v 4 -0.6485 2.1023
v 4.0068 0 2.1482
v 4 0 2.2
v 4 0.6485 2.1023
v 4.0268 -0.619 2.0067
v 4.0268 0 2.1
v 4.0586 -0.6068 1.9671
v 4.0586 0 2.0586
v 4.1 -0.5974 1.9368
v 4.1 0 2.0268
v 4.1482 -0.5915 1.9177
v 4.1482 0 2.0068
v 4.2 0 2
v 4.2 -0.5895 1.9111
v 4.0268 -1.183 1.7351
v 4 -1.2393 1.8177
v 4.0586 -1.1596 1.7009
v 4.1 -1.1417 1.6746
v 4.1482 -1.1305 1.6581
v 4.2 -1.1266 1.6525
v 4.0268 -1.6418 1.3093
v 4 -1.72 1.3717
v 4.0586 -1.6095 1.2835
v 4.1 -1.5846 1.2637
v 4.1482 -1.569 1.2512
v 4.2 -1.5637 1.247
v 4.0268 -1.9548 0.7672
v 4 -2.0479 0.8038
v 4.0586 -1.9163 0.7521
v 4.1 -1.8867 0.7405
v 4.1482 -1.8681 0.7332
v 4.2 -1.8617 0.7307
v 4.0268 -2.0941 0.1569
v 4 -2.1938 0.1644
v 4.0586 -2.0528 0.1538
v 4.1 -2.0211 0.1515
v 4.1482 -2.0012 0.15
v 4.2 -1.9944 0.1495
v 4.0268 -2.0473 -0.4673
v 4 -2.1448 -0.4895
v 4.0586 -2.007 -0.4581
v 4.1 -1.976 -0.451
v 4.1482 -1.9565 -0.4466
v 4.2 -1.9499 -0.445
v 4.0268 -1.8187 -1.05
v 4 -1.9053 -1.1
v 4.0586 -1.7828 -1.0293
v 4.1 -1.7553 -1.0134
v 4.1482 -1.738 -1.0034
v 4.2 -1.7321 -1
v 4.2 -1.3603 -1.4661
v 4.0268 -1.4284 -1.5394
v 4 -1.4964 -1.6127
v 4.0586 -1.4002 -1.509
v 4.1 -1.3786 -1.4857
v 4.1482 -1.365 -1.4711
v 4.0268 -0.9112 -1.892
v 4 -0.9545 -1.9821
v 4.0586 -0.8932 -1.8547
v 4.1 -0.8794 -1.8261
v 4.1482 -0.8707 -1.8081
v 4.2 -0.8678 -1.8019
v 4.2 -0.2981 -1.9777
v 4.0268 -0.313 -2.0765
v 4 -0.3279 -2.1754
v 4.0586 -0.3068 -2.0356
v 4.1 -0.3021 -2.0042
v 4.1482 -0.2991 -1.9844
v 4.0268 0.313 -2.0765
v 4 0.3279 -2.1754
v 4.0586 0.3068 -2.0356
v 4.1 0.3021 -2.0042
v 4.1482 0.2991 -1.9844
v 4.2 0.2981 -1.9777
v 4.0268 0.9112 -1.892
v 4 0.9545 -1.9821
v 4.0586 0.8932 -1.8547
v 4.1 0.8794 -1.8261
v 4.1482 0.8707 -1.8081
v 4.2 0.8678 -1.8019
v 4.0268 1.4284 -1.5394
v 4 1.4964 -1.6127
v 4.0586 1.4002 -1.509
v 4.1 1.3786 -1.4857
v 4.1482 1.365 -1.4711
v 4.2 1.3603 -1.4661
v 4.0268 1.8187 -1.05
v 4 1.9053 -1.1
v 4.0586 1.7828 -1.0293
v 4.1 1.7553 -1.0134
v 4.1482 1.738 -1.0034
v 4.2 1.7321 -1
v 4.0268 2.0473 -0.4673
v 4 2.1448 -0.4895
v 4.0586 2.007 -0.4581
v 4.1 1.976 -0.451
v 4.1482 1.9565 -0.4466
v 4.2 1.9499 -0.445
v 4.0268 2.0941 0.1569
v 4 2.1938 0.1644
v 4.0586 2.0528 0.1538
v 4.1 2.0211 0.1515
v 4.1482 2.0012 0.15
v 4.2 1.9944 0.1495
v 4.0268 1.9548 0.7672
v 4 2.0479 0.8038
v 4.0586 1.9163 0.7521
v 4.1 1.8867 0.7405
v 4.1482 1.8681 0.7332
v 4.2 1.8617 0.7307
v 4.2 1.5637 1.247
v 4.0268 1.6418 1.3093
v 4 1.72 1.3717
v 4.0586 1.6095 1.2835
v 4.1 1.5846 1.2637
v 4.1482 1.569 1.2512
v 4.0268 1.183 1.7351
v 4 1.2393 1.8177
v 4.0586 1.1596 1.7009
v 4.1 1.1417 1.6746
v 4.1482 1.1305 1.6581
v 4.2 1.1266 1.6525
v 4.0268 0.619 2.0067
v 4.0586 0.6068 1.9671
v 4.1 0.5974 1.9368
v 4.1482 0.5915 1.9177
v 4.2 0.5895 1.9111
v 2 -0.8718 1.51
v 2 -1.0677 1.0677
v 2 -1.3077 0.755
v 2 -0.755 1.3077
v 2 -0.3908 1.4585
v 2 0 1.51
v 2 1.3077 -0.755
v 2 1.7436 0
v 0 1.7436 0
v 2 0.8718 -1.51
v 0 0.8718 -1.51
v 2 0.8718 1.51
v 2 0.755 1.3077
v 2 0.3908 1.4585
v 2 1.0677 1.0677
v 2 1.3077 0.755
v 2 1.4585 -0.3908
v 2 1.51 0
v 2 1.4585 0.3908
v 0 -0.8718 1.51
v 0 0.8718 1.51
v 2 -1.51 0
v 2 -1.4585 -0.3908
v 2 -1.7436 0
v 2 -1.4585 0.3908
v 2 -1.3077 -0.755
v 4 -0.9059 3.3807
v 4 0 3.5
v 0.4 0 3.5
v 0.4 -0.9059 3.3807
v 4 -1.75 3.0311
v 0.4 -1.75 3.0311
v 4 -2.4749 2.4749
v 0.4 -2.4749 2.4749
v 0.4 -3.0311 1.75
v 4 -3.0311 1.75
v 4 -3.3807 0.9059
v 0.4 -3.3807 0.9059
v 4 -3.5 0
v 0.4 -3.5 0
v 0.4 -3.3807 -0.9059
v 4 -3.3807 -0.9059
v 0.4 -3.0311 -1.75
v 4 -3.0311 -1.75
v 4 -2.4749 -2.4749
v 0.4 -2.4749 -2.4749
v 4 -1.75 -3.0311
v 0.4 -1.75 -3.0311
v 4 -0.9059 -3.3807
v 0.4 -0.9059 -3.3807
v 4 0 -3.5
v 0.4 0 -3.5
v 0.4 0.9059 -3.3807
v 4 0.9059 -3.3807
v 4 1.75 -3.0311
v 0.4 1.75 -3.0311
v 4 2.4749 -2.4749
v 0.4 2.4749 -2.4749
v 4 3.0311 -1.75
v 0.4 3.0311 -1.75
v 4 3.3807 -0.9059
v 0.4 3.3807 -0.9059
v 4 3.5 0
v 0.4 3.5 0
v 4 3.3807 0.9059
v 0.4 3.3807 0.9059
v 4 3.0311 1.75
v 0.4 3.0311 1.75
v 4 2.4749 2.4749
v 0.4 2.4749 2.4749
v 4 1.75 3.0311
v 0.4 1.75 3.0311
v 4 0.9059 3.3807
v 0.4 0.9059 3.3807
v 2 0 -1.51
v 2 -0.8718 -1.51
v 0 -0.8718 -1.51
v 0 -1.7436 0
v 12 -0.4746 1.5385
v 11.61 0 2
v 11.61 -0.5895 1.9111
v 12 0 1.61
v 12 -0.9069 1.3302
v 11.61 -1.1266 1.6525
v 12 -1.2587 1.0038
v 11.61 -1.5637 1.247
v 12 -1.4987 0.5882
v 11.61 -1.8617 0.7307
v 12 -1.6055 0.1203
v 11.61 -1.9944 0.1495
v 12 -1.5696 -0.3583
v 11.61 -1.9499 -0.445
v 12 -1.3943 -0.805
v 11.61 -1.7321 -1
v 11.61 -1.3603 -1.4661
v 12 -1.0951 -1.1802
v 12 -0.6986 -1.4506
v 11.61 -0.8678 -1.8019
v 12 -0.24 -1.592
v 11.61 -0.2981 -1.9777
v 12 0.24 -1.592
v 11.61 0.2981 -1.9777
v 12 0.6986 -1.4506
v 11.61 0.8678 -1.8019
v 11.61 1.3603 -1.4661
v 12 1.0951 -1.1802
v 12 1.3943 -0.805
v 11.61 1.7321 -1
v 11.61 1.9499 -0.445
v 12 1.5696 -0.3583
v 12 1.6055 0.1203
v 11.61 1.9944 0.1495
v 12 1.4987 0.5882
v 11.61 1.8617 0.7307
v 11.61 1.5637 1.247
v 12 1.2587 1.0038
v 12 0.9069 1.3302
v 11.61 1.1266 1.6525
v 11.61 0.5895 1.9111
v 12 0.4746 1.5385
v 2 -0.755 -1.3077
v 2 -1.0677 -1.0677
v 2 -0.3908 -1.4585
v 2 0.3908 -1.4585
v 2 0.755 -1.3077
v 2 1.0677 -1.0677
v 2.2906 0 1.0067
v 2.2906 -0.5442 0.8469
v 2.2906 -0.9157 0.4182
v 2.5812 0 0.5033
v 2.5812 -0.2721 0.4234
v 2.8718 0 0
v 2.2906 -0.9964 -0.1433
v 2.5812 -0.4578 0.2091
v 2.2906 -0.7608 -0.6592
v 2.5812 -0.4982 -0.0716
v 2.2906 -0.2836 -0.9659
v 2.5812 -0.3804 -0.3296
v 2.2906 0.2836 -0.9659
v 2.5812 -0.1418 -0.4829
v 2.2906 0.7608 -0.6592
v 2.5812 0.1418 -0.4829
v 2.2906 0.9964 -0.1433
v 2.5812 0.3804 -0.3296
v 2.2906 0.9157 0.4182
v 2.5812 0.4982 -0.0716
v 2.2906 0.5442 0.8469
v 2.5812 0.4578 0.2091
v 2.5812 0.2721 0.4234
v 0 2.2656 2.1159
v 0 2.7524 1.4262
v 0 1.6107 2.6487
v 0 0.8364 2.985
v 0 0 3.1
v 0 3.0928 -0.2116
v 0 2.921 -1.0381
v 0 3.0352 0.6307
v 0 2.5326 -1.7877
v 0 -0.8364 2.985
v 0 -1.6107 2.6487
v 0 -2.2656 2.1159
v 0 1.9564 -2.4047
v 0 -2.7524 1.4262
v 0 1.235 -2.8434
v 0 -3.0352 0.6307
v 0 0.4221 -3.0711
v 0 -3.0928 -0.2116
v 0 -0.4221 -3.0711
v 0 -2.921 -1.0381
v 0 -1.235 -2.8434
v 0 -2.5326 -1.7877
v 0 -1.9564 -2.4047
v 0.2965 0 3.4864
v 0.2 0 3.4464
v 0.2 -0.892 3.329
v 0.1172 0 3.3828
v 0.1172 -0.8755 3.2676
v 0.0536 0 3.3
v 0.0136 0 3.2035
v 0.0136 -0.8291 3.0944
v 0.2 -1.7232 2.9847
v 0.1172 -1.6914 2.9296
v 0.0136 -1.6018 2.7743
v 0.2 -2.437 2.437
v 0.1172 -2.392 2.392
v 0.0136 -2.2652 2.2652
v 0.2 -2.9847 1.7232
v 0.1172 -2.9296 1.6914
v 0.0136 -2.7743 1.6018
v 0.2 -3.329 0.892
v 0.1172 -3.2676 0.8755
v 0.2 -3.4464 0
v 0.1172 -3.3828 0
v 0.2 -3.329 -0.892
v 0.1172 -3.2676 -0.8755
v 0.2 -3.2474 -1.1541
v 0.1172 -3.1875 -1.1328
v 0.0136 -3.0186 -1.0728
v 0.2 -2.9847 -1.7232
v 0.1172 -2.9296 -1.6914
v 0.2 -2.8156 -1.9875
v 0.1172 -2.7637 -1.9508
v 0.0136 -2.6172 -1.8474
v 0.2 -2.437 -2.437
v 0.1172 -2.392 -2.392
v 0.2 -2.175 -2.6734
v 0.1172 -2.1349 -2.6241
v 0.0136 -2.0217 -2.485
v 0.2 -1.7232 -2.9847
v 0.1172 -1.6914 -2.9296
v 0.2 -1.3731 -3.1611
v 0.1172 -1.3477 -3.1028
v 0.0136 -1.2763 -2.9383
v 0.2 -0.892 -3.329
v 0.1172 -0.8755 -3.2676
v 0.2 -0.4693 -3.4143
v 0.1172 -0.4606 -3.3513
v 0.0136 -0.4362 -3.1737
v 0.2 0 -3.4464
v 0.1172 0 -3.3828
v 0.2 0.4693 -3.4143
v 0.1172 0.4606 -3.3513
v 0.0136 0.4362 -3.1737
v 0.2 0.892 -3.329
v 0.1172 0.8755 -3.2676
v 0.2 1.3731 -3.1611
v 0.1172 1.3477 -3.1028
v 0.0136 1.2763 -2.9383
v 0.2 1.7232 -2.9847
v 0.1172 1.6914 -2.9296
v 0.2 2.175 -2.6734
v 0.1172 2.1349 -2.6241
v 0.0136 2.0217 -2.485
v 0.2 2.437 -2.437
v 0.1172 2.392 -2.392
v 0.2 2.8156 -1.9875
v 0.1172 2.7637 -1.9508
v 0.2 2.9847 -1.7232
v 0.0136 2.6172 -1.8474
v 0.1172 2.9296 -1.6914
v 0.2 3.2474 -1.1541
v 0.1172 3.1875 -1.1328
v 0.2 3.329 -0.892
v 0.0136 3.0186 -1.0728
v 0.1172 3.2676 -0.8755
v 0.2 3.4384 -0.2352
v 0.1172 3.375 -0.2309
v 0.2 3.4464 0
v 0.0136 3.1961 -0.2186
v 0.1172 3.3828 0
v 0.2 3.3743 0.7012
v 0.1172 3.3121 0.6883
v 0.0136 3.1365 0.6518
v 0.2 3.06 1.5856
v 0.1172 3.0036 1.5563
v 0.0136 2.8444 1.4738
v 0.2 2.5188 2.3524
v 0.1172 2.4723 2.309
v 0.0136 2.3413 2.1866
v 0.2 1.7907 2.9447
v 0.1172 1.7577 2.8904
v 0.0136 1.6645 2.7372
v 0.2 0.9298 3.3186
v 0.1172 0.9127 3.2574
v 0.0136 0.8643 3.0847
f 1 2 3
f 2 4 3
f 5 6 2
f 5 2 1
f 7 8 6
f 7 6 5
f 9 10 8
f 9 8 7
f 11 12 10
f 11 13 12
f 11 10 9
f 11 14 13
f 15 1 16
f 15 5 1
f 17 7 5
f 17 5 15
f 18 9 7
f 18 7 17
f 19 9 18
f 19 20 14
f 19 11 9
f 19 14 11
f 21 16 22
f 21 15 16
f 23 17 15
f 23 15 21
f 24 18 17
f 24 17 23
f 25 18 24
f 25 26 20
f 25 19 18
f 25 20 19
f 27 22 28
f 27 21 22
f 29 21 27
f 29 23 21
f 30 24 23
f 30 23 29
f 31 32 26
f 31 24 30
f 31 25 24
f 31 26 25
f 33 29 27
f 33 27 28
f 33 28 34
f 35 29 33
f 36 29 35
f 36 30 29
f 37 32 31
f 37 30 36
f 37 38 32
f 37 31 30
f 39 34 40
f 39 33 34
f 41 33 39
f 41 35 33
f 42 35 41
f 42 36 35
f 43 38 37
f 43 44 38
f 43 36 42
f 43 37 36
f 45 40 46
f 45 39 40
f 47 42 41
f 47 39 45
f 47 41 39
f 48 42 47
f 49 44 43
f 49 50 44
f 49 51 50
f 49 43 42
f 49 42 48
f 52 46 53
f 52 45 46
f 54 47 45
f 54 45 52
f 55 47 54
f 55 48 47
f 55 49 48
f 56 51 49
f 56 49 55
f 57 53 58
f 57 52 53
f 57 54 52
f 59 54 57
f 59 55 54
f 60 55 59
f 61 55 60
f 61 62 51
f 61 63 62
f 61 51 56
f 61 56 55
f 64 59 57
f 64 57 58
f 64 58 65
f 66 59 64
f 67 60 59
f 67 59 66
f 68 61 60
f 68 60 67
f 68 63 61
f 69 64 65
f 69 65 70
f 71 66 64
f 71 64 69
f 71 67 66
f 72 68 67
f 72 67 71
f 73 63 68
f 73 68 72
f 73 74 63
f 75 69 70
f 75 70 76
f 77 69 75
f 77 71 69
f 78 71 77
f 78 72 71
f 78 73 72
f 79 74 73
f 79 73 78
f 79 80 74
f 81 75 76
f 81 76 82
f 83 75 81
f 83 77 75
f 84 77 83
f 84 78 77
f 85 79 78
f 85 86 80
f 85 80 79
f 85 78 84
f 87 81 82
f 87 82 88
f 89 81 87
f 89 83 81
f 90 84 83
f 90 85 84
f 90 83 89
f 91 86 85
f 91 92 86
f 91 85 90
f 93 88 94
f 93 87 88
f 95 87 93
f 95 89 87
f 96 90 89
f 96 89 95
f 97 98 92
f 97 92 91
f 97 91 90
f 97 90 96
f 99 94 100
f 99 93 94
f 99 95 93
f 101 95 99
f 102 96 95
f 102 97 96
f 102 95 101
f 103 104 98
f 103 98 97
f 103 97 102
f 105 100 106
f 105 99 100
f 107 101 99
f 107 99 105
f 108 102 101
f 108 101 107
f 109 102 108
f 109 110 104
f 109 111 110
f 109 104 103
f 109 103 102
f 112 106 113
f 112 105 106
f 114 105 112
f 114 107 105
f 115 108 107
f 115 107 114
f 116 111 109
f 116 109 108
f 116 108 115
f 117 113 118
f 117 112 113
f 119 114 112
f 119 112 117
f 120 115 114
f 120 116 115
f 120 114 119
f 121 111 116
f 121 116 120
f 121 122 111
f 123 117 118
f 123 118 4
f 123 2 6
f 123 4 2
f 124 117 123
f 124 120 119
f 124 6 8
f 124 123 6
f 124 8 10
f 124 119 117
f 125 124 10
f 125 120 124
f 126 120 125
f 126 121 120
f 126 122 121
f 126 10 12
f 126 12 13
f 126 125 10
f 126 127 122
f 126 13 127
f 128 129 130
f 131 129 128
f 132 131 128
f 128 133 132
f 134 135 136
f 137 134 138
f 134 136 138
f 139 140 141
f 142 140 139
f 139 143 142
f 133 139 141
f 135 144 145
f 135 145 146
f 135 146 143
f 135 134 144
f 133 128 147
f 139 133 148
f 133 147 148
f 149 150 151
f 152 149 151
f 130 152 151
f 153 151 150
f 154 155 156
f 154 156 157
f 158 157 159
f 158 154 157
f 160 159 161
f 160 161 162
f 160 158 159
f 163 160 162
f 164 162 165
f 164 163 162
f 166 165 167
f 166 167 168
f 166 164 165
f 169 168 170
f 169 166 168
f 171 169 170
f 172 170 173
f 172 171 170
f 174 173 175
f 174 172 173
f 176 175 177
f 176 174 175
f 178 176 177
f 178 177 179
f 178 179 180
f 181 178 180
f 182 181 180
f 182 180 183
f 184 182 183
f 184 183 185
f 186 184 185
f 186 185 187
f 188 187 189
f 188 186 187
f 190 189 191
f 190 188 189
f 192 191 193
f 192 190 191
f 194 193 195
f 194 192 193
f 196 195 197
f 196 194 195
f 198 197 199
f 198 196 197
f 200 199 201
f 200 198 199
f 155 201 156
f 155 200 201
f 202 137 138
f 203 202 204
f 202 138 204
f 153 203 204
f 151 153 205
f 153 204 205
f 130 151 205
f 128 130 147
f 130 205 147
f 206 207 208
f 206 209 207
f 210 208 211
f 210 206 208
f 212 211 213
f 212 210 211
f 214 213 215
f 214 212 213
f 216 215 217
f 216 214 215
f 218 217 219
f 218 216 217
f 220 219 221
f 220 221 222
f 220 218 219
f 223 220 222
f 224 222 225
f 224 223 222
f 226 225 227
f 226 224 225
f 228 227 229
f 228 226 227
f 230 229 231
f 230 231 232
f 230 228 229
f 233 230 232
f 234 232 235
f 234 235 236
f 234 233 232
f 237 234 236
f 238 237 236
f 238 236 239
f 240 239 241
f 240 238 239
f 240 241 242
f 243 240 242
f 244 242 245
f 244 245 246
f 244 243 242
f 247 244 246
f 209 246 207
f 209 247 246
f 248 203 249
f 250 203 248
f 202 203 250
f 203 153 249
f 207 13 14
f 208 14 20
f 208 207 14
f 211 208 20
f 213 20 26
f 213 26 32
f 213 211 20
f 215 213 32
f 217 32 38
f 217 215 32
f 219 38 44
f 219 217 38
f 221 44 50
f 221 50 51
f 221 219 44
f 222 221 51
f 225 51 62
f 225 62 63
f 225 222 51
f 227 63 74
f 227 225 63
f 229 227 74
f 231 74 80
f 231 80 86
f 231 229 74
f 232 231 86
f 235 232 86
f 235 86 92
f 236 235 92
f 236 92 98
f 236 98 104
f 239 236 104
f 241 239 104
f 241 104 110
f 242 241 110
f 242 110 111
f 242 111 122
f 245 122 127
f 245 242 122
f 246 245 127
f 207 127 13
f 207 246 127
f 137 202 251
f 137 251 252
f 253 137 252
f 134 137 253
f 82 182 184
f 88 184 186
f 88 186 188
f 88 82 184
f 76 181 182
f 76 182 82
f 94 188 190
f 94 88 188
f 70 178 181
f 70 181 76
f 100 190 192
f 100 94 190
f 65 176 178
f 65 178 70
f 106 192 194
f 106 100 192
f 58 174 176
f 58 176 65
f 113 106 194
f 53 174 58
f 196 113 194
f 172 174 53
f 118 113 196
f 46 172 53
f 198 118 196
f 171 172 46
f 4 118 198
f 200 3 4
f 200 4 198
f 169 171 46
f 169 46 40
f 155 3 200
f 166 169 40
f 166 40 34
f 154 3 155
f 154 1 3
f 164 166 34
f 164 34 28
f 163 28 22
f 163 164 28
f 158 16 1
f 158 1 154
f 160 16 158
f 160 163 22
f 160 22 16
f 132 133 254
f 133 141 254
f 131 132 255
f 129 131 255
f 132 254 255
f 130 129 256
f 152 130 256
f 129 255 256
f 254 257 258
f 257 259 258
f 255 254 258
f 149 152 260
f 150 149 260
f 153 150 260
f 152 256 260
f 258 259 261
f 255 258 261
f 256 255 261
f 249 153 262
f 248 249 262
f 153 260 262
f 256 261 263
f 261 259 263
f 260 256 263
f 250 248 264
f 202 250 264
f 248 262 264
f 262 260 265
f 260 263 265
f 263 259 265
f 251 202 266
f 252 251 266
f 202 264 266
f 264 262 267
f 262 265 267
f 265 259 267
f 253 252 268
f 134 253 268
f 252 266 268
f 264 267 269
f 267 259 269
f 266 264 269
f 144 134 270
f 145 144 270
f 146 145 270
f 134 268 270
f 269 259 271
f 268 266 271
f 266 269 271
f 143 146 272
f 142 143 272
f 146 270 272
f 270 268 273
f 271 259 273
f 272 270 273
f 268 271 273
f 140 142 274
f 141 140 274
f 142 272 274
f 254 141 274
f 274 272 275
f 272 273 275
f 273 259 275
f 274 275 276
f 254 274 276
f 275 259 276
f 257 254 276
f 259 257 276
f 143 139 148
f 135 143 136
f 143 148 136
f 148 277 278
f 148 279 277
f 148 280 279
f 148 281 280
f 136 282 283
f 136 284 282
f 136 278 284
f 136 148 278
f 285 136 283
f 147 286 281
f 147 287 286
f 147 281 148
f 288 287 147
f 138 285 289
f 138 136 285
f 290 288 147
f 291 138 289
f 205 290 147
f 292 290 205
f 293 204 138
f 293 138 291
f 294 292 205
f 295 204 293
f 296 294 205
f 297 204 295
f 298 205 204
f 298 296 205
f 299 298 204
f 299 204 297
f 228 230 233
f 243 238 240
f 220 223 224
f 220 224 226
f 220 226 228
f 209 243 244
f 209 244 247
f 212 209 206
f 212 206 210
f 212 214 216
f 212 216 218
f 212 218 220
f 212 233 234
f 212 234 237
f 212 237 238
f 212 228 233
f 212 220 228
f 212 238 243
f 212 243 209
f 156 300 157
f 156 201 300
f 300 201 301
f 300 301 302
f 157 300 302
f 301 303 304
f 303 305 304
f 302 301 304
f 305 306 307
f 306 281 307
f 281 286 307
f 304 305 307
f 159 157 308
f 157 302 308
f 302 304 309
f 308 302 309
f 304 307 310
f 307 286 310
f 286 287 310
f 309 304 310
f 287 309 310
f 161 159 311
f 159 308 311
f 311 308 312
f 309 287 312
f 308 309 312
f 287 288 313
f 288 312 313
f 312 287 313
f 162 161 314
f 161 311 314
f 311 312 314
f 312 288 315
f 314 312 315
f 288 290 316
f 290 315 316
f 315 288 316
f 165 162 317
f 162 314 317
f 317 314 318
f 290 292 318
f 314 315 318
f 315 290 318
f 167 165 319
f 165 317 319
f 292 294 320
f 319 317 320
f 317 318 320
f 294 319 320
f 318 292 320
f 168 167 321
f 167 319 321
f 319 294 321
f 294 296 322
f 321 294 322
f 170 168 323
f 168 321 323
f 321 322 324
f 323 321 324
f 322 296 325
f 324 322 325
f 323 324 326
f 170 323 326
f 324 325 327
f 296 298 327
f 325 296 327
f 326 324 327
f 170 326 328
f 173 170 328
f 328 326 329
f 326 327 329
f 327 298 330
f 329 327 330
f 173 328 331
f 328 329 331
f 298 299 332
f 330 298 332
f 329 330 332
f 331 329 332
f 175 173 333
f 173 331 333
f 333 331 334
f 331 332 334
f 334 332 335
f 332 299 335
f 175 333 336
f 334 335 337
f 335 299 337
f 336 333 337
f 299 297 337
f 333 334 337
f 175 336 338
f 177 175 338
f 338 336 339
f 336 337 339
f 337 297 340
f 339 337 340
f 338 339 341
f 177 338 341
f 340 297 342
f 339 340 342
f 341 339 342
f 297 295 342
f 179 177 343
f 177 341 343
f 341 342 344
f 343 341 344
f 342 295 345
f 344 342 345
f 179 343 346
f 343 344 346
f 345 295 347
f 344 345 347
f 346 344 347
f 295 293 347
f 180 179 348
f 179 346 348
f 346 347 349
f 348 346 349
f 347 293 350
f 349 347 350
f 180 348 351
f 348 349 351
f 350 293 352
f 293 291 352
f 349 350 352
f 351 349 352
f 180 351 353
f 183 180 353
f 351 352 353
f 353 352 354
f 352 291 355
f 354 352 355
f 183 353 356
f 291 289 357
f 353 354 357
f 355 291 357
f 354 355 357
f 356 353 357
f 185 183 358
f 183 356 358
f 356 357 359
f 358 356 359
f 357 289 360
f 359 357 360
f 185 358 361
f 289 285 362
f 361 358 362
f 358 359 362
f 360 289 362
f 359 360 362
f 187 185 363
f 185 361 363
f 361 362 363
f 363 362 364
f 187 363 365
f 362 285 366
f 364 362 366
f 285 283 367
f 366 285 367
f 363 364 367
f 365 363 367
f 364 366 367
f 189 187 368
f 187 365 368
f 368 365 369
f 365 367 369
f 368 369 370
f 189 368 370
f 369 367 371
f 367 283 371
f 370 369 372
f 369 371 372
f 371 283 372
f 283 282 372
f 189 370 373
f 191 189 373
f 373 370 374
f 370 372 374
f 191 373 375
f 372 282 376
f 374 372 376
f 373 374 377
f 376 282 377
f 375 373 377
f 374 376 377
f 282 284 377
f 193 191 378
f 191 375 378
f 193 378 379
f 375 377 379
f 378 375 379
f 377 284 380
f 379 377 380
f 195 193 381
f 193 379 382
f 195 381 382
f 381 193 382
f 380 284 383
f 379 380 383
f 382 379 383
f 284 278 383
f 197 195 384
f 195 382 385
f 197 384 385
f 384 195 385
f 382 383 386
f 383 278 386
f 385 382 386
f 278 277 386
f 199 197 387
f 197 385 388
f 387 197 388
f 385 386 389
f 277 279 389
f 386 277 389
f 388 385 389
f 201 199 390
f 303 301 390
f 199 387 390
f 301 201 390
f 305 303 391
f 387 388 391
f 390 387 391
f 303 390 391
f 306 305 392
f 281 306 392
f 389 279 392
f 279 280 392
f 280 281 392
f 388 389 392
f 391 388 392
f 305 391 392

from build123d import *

# Parameters (mm, degrees)
FILLET1_R   = 0.2
FILLET2_R   = 0.4
HEX_2_DEPTH = 2


with BuildPart() as part:
    # BodySke → Base-Revolve (revolve)
    with BuildSketch(Plane.XY, mode=Mode.PRIVATE) as base_revolve_sk:
        Polygon((0, 0), (0, 3.5), (4, 3.5), (4, 2), (11.61, 2), (12, 1.61), (12, 0), align=None)
    revolve(base_revolve_sk.sketch.rotate(Axis((-31.75, 0, 0), (1, 0, 0)), 90), axis=Axis((-31.75, 0, 0), (1, 0, 0)))

    # Fillet1
    fillet1_edges = [part.edges().sort_by_distance(p)[0] for p in [
        (4, 0, -2),
    ]]
    fillet(fillet1_edges, radius=FILLET1_R)

    # Fillet2
    fillet2_edges = [part.edges().sort_by_distance(p)[0] for p in [
        (0, 0, -3.5),
    ]]
    fillet(fillet2_edges, radius=FILLET2_R)

    # Sketch2 → Hex-PreBroach (revolve, cut)
    with BuildSketch(Plane.XY, mode=Mode.PRIVATE) as hex_prebroach_sk:
        Polygon((0, 1.51), (2, 1.51), (2.871798906, 0), (0, 0), align=None)
    revolve(hex_prebroach_sk.sketch.rotate(Axis((0, 0, 0), (1, 0, 0)), 90), axis=Axis((0, 0, 0), (1, 0, 0)), mode=Mode.SUBTRACT)

    # Sketch3 → Hex 2 (cut)
    with BuildSketch(Plane(origin=(0, 0, 0), x_dir=(0, 0.500000000000001, 0.866025403784438), z_dir=(-1, 0, 0))):
        Polygon((0.871798906, 1.51), (-0.871798906, 1.51), (-1.743597813, 0), (-0.871798906, -1.51), (0.871798906, -1.51), (1.743597813, 0), align=None)
    extrude(amount=-HEX_2_DEPTH, mode=Mode.SUBTRACT)


solid = part.part
